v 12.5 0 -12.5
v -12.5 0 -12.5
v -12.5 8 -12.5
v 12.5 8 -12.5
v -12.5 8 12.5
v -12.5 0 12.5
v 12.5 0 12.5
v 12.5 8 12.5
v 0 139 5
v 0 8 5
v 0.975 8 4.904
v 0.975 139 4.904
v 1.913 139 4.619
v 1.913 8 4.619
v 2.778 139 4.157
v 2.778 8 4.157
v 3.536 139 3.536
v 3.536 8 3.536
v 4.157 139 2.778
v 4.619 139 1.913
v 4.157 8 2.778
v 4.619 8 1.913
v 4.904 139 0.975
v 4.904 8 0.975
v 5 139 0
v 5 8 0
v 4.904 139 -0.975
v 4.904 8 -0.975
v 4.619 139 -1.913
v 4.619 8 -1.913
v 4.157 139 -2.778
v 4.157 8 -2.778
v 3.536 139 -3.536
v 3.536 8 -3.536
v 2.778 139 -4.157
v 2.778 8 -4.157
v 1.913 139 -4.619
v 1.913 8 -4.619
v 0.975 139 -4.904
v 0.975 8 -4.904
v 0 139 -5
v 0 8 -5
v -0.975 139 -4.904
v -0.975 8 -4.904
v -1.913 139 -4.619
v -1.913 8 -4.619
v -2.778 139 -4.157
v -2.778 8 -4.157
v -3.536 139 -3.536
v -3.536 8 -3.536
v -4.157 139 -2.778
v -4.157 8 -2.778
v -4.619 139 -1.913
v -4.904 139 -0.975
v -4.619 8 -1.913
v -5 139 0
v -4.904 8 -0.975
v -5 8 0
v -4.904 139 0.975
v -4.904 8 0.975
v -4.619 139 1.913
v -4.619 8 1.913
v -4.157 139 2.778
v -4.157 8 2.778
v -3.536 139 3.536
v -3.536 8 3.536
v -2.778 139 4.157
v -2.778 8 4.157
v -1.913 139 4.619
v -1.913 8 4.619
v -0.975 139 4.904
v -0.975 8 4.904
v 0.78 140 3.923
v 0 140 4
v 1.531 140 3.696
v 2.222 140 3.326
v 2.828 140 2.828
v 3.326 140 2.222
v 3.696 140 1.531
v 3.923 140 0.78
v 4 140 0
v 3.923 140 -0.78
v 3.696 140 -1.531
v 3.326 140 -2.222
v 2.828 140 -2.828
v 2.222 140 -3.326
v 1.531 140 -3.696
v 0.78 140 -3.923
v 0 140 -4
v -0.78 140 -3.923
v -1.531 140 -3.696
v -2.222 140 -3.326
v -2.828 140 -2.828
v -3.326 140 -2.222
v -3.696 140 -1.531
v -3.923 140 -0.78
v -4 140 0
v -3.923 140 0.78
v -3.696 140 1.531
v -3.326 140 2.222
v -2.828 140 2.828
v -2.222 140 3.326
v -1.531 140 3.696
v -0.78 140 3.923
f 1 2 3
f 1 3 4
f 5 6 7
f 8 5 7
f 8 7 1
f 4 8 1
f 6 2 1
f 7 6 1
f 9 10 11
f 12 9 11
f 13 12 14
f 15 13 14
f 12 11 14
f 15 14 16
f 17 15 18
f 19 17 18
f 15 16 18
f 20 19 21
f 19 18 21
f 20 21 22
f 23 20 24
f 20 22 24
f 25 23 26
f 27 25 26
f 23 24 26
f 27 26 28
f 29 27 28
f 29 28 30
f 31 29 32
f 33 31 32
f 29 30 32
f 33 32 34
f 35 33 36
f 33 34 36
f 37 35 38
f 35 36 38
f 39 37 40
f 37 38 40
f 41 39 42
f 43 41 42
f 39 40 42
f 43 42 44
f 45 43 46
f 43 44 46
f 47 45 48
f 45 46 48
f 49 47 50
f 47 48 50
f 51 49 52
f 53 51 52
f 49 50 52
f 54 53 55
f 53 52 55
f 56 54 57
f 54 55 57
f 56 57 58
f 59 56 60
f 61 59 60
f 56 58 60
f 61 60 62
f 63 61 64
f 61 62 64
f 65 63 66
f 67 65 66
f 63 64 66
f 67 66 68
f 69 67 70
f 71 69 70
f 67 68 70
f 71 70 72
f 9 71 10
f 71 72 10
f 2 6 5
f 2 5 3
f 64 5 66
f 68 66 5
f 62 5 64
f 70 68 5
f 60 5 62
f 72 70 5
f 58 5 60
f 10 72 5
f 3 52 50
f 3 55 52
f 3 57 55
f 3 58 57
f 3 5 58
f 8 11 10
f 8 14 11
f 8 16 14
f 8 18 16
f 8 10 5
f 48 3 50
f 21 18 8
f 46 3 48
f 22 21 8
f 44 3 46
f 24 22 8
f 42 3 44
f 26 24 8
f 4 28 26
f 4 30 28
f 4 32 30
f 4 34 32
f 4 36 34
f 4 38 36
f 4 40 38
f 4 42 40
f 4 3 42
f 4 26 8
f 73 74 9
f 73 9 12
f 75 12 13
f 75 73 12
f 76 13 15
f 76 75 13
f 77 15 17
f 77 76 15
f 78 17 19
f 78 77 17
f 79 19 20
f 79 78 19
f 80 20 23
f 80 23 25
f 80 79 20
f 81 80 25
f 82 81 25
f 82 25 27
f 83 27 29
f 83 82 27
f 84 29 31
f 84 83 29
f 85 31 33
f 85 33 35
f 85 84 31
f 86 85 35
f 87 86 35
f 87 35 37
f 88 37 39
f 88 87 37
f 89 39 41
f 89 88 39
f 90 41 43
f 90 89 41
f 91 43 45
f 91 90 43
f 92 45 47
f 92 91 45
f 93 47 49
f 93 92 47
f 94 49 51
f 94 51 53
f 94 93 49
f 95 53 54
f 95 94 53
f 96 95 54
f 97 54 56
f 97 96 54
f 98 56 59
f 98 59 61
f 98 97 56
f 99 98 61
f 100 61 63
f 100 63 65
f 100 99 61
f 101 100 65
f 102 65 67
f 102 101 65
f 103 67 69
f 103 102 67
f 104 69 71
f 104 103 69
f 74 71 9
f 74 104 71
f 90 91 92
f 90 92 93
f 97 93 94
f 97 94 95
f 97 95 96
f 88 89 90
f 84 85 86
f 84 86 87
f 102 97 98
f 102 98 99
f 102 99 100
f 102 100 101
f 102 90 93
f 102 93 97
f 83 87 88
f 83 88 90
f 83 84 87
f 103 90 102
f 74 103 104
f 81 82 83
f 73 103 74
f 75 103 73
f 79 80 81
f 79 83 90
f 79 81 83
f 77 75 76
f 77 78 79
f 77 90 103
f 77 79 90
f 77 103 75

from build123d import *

# Parameters (mm, degrees)
SKETCH1_W           = 25
SKETCH1_H           = 25
BOSS_EXTRUDE1_DEPTH = 8
SKETCH2_R           = 5
BOSS_EXTRUDE2_DEPTH = 132
CHAMFER1_SIZE       = 1


with BuildPart() as part:
    # Sketch1 → Boss-Extrude1 (new body)
    with BuildSketch(Plane(origin=(0, 0, 0), x_dir=(1, 0, 0), z_dir=(0, 1, 0))):
        Rectangle(SKETCH1_W, SKETCH1_H)
    extrude(amount=BOSS_EXTRUDE1_DEPTH)

    # Sketch2 → Boss-Extrude2 (add)
    with BuildSketch(Plane(origin=(0, 8, 0), x_dir=(1, 0, 0), z_dir=(0, 1, 0))):
        with Locations(Location((0, 0, 0), (0, 0, 270))):
            Circle(SKETCH2_R)
    extrude(amount=BOSS_EXTRUDE2_DEPTH)

    # Chamfer1
    chamfer1_edges = [part.edges().sort_by_distance(p)[0] for p in [
        (0, 140, -5),
    ]]
    chamfer(chamfer1_edges, length=CHAMFER1_SIZE)


solid = part.part
